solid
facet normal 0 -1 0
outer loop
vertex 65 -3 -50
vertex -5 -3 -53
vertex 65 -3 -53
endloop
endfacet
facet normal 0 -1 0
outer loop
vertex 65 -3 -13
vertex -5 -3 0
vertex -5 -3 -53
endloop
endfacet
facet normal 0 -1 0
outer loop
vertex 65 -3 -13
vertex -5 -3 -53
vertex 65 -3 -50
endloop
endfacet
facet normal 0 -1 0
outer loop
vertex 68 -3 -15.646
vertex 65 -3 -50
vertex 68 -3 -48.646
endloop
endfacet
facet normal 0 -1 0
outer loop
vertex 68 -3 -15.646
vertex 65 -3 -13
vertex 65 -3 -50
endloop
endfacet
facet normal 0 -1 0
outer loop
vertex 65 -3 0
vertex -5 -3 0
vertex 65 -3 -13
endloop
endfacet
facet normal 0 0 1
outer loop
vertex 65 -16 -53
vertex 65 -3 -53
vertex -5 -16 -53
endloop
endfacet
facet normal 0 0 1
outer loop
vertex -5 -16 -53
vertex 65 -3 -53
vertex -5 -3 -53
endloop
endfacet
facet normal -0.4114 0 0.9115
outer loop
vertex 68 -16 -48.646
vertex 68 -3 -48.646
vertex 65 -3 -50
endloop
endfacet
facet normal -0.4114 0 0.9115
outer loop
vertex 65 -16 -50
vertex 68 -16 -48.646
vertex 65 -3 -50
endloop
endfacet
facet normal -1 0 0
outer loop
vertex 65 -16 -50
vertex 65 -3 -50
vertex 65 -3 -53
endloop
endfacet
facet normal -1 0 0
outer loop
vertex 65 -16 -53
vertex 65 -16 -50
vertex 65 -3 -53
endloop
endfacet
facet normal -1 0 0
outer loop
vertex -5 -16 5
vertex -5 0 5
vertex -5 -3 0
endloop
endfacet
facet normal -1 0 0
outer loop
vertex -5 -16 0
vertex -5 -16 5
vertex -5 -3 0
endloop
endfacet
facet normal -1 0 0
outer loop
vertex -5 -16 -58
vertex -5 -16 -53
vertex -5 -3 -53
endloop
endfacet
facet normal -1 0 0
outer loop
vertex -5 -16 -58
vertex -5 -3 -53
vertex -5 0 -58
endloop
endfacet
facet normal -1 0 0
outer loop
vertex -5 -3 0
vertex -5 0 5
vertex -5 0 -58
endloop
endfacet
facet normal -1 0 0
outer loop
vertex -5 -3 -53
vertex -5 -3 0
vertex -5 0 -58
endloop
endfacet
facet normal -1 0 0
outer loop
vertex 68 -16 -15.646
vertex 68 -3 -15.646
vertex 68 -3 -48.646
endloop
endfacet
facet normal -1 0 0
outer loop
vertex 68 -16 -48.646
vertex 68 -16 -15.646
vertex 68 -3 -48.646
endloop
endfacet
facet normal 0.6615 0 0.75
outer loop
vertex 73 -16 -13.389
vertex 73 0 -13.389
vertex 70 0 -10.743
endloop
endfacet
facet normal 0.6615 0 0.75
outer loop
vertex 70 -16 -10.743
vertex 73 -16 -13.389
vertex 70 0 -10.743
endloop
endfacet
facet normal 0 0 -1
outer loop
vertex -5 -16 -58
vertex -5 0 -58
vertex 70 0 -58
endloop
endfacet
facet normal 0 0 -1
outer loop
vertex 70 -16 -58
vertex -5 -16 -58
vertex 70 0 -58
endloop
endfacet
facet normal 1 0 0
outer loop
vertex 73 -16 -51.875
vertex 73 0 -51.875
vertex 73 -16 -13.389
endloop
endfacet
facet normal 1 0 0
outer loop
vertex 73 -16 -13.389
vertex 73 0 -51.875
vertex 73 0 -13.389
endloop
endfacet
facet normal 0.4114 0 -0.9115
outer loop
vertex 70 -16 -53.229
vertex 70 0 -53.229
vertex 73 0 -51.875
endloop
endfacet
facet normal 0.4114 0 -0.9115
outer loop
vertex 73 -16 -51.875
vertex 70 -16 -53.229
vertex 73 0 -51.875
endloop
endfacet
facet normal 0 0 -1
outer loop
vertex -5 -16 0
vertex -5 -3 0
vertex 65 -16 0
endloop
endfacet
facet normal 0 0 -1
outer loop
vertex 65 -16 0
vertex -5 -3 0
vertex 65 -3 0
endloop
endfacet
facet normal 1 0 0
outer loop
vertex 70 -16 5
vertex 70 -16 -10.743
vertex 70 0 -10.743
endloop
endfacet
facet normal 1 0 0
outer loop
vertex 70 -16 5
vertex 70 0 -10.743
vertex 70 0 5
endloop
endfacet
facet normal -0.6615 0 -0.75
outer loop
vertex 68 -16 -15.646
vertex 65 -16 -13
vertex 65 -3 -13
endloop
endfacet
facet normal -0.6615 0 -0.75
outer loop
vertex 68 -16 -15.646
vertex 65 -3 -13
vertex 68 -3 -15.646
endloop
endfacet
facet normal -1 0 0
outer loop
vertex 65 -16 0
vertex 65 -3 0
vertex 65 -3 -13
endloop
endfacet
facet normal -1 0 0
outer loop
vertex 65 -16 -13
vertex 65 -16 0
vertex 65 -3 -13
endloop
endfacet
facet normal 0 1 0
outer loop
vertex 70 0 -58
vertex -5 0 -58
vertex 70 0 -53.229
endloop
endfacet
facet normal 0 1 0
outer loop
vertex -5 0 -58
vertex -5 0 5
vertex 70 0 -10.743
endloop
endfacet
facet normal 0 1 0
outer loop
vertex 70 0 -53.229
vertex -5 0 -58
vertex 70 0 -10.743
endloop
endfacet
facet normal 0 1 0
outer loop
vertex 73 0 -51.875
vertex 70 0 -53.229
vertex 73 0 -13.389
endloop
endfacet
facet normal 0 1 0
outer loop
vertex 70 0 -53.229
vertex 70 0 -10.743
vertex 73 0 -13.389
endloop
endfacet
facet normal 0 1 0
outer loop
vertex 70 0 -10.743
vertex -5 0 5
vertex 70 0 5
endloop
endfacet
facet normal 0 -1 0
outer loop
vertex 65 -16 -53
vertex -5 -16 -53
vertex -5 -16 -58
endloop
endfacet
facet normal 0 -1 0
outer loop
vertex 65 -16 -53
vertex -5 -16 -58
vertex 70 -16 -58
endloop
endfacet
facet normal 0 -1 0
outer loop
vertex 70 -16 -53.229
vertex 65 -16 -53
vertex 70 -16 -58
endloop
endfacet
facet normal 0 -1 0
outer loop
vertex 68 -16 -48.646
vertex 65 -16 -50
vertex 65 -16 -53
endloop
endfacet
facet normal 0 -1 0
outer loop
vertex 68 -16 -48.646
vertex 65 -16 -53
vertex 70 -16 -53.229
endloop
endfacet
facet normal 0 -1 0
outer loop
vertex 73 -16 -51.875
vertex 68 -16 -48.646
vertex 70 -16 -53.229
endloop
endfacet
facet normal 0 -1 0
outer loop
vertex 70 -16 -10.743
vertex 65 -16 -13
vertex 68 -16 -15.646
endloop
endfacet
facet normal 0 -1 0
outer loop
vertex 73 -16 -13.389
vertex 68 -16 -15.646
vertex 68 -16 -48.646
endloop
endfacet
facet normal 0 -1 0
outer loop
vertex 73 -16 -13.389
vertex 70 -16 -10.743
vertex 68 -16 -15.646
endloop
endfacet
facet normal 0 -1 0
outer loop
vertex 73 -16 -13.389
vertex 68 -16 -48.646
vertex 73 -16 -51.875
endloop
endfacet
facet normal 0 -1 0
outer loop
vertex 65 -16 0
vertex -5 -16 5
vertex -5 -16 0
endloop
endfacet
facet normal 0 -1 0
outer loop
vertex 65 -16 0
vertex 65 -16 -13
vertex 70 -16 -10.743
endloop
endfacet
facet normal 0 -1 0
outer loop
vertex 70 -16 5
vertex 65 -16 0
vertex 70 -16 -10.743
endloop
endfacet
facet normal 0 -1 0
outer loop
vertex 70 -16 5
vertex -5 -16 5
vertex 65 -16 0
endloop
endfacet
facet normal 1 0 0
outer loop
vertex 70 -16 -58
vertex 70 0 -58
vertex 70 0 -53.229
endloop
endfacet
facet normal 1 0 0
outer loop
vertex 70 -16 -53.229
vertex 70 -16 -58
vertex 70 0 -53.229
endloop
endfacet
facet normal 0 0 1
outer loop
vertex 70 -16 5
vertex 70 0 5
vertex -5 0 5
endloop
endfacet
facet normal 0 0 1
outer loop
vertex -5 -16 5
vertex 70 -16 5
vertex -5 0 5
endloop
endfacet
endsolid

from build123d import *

# Parameters (mm, degrees)
F1_DEPTH = 16
F0_W     = 5
F0_H     = 53
F2_DEPTH = 1.7
F3_DEPTH = 3
F4_DEPTH = 3


with BuildPart() as f1:
    # F0 (on Front) → F1 (new body)
    with BuildSketch(Plane.XZ):
        Polygon((-5, 0), (0, 0), (65, 0), (65, -13), (68, -15.645751), (68, -48.645751), (65, -50), (65, -53), (0, -53), (-5, -53), (-5, -58), (70, -58), (70, -53.228757), (73, -51.874508), (73, -13.38867), (70, -10.742919), (70, 5), (-5, 5), align=None)
    extrude(amount=F1_DEPTH)

    # F0 (on Front) → F2 (join)
    with BuildSketch(Plane.XZ):
        Polygon((-5, 0), (0, 0), (65, 0), (65, -13), (68, -15.645751), (68, -48.645751), (65, -50), (65, -53), (0, -53), (-5, -53), (-5, -58), (70, -58), (70, -53.228757), (73, -51.874508), (73, -13.38867), (70, -10.742919), (70, 5), (-5, 5), align=None)
        with Locations((-2.5, -26.5)):
            Rectangle(F0_W, F0_H)
    extrude(amount=F2_DEPTH)

    # F0 (on Front) → F3 (join)
    with BuildSketch(Plane.XZ):
        Polygon((-5, 0), (0, 0), (65, 0), (65, -13), (68, -15.645751), (68, -48.645751), (65, -50), (65, -53), (0, -53), (-5, -53), (-5, -58), (70, -58), (70, -53.228757), (73, -51.874508), (73, -13.38867), (70, -10.742919), (70, 5), (-5, 5), align=None)
        with Locations((-2.5, -26.5)):
            Rectangle(F0_W, F0_H)
    extrude(amount=F3_DEPTH)

    # F0 (on Front) → F4 (join)
    with BuildSketch(Plane.XZ):
        Polygon((65, 0), (0, 0), (0, -53), (65, -53), (65, -50), (68, -48.645751), (68, -15.645751), (65, -13), align=None)
    extrude(amount=F4_DEPTH)


solid = f1.part
